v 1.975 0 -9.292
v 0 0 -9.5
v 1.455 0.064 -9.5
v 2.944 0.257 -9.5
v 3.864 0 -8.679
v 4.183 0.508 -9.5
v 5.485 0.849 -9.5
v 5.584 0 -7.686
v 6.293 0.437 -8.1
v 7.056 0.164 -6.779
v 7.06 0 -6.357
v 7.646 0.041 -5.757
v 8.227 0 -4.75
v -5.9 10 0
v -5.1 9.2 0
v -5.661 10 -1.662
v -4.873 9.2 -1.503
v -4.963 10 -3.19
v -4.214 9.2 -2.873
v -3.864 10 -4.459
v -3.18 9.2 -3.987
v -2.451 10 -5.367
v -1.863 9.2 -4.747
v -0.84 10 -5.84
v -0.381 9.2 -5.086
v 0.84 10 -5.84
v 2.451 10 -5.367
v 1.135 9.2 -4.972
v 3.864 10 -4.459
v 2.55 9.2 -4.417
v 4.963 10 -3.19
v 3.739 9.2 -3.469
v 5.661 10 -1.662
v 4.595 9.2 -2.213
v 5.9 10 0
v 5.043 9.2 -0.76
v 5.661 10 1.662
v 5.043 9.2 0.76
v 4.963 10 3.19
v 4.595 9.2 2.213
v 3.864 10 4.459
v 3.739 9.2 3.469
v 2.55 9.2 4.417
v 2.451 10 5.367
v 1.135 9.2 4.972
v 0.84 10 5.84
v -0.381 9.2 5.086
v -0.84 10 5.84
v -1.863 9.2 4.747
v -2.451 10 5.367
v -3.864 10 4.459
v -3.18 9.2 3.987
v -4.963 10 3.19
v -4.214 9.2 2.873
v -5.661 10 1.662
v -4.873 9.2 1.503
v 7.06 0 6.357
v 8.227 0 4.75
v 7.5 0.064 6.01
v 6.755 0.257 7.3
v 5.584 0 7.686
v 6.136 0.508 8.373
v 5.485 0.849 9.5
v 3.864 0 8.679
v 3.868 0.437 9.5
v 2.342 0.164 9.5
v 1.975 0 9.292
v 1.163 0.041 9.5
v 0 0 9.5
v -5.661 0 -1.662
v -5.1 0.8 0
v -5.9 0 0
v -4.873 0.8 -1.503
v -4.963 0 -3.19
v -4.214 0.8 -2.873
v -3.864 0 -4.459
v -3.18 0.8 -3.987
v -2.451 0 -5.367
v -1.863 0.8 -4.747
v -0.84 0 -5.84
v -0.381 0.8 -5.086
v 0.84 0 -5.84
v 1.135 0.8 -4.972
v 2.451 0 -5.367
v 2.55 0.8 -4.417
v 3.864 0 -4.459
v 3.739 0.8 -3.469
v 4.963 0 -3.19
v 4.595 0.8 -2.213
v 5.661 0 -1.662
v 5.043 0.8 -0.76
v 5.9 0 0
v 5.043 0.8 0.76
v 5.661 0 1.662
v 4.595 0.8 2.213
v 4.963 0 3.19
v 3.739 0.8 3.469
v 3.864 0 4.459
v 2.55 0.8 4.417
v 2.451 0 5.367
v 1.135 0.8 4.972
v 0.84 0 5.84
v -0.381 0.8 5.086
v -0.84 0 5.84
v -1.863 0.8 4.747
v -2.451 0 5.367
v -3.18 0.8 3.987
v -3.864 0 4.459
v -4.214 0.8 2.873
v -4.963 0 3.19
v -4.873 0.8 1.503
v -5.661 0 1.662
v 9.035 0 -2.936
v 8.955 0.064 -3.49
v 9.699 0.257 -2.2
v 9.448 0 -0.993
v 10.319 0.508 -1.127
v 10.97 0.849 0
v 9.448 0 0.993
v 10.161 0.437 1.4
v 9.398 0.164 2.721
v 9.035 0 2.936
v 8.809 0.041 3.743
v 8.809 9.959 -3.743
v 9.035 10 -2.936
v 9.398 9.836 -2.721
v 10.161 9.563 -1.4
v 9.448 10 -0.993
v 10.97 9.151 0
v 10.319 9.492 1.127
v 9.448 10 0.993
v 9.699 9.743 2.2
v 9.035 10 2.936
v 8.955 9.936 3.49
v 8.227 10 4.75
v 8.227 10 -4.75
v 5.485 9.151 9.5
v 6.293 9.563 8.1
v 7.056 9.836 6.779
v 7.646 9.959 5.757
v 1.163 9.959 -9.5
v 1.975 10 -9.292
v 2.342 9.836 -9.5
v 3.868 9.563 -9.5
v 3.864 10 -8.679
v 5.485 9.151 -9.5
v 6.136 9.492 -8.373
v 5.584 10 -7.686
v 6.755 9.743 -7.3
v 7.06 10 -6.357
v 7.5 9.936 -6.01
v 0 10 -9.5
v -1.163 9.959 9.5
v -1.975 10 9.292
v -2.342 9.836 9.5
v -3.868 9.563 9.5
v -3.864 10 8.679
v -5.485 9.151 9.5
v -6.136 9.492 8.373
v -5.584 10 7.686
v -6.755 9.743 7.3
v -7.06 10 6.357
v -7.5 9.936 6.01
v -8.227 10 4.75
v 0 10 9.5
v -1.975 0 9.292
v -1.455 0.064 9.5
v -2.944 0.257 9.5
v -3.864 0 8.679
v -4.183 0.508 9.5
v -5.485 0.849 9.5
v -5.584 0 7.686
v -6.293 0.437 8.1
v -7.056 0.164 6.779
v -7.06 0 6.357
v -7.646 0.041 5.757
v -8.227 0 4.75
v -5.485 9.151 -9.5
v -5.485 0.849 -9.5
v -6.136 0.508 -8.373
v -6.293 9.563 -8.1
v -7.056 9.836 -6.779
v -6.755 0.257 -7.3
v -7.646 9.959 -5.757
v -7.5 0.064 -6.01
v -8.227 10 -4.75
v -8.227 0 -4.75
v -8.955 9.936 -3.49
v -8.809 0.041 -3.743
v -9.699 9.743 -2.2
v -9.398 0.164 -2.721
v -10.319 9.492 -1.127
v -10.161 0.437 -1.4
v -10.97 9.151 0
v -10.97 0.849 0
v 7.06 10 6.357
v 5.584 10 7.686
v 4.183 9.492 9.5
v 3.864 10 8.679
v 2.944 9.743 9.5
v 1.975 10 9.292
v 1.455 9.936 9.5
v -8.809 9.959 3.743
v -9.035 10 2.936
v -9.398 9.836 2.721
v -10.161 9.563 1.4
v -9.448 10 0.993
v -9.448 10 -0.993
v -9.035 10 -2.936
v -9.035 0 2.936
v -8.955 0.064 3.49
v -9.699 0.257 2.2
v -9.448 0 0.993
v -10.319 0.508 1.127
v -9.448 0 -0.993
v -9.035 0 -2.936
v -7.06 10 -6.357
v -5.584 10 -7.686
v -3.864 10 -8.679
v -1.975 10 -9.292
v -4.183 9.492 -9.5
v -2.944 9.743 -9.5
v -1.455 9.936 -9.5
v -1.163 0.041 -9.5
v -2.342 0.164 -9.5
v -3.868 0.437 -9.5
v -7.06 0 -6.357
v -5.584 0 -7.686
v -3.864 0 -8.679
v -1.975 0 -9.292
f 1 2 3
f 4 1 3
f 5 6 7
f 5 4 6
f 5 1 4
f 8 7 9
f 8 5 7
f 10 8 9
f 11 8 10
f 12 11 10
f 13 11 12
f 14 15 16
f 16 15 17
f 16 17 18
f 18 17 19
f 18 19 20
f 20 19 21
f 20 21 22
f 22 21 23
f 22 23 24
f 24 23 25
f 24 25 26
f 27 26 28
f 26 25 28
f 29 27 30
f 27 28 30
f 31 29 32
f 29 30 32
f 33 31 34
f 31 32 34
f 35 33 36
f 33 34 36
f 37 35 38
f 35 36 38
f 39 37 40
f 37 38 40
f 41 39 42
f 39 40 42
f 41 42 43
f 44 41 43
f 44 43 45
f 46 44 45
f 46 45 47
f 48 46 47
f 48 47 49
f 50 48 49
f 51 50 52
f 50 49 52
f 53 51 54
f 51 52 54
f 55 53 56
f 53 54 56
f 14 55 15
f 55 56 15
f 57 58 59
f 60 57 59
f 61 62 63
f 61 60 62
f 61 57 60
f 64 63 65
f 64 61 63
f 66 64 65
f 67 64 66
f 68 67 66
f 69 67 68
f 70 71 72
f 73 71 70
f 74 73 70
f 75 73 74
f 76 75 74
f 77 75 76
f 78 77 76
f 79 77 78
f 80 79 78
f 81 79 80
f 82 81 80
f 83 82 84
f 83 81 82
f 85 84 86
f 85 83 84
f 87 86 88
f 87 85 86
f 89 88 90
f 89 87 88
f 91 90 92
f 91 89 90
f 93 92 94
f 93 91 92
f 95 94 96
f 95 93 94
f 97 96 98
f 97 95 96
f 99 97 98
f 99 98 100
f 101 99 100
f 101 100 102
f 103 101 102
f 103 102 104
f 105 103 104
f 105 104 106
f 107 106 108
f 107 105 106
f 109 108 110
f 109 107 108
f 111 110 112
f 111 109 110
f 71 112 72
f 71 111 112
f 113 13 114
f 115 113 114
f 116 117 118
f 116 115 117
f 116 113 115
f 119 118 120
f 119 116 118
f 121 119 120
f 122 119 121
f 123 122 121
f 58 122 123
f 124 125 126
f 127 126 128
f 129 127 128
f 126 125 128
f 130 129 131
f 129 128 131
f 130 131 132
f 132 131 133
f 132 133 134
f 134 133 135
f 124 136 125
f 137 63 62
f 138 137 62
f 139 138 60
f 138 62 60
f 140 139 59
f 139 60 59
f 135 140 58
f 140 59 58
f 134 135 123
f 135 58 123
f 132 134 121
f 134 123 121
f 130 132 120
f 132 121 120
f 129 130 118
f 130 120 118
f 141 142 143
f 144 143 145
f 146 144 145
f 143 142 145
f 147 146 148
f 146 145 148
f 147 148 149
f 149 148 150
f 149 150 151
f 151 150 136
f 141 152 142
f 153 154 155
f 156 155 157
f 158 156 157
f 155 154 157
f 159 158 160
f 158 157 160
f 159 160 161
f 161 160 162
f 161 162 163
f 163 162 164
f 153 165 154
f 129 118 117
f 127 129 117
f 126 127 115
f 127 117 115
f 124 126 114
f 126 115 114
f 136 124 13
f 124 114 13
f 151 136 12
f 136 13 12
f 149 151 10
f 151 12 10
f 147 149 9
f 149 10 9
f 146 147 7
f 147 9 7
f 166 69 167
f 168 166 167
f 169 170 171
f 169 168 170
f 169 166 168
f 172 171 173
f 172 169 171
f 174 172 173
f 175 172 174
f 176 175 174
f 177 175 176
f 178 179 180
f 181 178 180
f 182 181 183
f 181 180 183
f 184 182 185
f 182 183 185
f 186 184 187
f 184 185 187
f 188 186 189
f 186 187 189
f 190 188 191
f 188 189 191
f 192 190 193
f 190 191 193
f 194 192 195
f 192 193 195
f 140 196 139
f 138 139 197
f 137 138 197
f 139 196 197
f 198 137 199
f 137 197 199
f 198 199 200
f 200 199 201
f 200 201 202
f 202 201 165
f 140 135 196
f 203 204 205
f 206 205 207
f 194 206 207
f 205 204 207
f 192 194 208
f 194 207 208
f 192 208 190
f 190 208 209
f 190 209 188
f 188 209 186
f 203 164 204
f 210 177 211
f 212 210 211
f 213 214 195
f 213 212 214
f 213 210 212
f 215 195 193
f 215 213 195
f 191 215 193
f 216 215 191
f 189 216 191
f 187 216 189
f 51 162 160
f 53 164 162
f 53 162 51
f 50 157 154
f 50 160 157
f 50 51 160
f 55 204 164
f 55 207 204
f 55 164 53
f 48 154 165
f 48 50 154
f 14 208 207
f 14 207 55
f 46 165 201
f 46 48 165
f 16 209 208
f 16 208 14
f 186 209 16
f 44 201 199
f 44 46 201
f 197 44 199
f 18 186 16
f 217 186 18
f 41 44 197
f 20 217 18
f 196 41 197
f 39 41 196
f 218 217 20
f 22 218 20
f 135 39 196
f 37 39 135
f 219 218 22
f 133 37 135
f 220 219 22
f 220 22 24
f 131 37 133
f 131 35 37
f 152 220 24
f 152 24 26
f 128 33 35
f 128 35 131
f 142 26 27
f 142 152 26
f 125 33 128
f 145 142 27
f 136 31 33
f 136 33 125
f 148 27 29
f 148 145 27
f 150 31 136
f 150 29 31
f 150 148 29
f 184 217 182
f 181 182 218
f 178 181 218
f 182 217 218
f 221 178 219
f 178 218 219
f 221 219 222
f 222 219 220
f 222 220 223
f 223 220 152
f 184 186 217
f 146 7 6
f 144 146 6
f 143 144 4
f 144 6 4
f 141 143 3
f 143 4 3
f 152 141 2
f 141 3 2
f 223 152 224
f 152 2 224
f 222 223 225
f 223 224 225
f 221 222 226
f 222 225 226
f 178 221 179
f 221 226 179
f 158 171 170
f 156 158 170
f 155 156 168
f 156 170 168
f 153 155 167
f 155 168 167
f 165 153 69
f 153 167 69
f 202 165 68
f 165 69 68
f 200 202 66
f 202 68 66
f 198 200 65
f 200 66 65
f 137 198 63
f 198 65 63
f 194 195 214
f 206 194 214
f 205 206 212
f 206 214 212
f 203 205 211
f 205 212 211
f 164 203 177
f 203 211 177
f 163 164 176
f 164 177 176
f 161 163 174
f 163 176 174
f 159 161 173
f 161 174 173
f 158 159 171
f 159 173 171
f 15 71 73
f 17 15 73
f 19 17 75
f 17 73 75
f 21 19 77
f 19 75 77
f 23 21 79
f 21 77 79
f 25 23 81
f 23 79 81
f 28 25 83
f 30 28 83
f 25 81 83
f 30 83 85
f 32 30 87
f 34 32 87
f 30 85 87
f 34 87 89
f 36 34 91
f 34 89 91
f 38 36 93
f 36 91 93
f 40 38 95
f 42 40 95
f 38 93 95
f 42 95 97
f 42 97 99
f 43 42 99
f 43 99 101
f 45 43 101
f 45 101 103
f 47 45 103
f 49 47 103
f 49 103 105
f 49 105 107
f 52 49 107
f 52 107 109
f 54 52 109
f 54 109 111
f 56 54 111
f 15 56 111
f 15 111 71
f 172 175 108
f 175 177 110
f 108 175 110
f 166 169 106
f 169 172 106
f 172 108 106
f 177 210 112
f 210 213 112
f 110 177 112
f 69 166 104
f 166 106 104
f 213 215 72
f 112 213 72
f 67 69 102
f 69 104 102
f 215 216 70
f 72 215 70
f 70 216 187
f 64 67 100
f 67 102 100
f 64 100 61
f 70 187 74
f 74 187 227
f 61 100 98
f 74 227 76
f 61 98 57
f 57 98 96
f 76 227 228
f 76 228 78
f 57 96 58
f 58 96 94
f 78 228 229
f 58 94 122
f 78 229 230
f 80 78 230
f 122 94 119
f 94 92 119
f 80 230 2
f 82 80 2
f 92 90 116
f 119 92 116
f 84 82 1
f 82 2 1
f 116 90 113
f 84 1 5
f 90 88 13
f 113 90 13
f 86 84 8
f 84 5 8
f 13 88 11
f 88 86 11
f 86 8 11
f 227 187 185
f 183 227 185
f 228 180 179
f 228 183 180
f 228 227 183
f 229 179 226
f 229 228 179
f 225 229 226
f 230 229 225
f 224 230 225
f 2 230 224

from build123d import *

# Parameters (mm, degrees)
BOSS_EXTRUDE1_DEPTH = 10
M12_TAPPED_HOLE1_D  = 10.2
CHAMFER1_SIZE       = 0.8


with BuildPart() as part:
    # Sketch1 → Boss-Extrude1 (new body)
    with BuildSketch(Plane(origin=(0, 0, 0), x_dir=(1, 0, 0), z_dir=(0, 1, 0))):
        Polygon((5.484827557, 9.5), (-5.484827557, 9.5), (-10.969655115, 0), (-5.484827557, -9.5), (5.484827557, -9.5), (10.969655115, 0), align=None)
    extrude(amount=BOSS_EXTRUDE1_DEPTH)

    # Sketch3 → Cut-Revolve1 (revolve, cut)
    with BuildSketch(Plane.XY):
        Polygon((9.5, 10), (10.969655115, 10), (10.969655115, 9.151494224), align=None)
        Polygon((10.969655115, 0.848505776), (9.5, 0), (10.969655115, 0), align=None)
    revolve(axis=Axis((0, 10, 0), (0, -1, 0)), mode=Mode.SUBTRACT)

    # M12 Tapped Hole1 (through all)
    with Locations(Plane(origin=(0, 10, 0), x_dir=(1, 0, 0), z_dir=(0, 1, 0))):
        with Locations((0, 0)):
            Hole(M12_TAPPED_HOLE1_D / 2)

    # Chamfer1
    chamfer1_edges = [part.edges().sort_by_distance(p)[0] for p in [
        (5.1, 10, 0),
        (5.1, 0, 0),
    ]]
    chamfer(chamfer1_edges, length=CHAMFER1_SIZE)


solid = part.part
